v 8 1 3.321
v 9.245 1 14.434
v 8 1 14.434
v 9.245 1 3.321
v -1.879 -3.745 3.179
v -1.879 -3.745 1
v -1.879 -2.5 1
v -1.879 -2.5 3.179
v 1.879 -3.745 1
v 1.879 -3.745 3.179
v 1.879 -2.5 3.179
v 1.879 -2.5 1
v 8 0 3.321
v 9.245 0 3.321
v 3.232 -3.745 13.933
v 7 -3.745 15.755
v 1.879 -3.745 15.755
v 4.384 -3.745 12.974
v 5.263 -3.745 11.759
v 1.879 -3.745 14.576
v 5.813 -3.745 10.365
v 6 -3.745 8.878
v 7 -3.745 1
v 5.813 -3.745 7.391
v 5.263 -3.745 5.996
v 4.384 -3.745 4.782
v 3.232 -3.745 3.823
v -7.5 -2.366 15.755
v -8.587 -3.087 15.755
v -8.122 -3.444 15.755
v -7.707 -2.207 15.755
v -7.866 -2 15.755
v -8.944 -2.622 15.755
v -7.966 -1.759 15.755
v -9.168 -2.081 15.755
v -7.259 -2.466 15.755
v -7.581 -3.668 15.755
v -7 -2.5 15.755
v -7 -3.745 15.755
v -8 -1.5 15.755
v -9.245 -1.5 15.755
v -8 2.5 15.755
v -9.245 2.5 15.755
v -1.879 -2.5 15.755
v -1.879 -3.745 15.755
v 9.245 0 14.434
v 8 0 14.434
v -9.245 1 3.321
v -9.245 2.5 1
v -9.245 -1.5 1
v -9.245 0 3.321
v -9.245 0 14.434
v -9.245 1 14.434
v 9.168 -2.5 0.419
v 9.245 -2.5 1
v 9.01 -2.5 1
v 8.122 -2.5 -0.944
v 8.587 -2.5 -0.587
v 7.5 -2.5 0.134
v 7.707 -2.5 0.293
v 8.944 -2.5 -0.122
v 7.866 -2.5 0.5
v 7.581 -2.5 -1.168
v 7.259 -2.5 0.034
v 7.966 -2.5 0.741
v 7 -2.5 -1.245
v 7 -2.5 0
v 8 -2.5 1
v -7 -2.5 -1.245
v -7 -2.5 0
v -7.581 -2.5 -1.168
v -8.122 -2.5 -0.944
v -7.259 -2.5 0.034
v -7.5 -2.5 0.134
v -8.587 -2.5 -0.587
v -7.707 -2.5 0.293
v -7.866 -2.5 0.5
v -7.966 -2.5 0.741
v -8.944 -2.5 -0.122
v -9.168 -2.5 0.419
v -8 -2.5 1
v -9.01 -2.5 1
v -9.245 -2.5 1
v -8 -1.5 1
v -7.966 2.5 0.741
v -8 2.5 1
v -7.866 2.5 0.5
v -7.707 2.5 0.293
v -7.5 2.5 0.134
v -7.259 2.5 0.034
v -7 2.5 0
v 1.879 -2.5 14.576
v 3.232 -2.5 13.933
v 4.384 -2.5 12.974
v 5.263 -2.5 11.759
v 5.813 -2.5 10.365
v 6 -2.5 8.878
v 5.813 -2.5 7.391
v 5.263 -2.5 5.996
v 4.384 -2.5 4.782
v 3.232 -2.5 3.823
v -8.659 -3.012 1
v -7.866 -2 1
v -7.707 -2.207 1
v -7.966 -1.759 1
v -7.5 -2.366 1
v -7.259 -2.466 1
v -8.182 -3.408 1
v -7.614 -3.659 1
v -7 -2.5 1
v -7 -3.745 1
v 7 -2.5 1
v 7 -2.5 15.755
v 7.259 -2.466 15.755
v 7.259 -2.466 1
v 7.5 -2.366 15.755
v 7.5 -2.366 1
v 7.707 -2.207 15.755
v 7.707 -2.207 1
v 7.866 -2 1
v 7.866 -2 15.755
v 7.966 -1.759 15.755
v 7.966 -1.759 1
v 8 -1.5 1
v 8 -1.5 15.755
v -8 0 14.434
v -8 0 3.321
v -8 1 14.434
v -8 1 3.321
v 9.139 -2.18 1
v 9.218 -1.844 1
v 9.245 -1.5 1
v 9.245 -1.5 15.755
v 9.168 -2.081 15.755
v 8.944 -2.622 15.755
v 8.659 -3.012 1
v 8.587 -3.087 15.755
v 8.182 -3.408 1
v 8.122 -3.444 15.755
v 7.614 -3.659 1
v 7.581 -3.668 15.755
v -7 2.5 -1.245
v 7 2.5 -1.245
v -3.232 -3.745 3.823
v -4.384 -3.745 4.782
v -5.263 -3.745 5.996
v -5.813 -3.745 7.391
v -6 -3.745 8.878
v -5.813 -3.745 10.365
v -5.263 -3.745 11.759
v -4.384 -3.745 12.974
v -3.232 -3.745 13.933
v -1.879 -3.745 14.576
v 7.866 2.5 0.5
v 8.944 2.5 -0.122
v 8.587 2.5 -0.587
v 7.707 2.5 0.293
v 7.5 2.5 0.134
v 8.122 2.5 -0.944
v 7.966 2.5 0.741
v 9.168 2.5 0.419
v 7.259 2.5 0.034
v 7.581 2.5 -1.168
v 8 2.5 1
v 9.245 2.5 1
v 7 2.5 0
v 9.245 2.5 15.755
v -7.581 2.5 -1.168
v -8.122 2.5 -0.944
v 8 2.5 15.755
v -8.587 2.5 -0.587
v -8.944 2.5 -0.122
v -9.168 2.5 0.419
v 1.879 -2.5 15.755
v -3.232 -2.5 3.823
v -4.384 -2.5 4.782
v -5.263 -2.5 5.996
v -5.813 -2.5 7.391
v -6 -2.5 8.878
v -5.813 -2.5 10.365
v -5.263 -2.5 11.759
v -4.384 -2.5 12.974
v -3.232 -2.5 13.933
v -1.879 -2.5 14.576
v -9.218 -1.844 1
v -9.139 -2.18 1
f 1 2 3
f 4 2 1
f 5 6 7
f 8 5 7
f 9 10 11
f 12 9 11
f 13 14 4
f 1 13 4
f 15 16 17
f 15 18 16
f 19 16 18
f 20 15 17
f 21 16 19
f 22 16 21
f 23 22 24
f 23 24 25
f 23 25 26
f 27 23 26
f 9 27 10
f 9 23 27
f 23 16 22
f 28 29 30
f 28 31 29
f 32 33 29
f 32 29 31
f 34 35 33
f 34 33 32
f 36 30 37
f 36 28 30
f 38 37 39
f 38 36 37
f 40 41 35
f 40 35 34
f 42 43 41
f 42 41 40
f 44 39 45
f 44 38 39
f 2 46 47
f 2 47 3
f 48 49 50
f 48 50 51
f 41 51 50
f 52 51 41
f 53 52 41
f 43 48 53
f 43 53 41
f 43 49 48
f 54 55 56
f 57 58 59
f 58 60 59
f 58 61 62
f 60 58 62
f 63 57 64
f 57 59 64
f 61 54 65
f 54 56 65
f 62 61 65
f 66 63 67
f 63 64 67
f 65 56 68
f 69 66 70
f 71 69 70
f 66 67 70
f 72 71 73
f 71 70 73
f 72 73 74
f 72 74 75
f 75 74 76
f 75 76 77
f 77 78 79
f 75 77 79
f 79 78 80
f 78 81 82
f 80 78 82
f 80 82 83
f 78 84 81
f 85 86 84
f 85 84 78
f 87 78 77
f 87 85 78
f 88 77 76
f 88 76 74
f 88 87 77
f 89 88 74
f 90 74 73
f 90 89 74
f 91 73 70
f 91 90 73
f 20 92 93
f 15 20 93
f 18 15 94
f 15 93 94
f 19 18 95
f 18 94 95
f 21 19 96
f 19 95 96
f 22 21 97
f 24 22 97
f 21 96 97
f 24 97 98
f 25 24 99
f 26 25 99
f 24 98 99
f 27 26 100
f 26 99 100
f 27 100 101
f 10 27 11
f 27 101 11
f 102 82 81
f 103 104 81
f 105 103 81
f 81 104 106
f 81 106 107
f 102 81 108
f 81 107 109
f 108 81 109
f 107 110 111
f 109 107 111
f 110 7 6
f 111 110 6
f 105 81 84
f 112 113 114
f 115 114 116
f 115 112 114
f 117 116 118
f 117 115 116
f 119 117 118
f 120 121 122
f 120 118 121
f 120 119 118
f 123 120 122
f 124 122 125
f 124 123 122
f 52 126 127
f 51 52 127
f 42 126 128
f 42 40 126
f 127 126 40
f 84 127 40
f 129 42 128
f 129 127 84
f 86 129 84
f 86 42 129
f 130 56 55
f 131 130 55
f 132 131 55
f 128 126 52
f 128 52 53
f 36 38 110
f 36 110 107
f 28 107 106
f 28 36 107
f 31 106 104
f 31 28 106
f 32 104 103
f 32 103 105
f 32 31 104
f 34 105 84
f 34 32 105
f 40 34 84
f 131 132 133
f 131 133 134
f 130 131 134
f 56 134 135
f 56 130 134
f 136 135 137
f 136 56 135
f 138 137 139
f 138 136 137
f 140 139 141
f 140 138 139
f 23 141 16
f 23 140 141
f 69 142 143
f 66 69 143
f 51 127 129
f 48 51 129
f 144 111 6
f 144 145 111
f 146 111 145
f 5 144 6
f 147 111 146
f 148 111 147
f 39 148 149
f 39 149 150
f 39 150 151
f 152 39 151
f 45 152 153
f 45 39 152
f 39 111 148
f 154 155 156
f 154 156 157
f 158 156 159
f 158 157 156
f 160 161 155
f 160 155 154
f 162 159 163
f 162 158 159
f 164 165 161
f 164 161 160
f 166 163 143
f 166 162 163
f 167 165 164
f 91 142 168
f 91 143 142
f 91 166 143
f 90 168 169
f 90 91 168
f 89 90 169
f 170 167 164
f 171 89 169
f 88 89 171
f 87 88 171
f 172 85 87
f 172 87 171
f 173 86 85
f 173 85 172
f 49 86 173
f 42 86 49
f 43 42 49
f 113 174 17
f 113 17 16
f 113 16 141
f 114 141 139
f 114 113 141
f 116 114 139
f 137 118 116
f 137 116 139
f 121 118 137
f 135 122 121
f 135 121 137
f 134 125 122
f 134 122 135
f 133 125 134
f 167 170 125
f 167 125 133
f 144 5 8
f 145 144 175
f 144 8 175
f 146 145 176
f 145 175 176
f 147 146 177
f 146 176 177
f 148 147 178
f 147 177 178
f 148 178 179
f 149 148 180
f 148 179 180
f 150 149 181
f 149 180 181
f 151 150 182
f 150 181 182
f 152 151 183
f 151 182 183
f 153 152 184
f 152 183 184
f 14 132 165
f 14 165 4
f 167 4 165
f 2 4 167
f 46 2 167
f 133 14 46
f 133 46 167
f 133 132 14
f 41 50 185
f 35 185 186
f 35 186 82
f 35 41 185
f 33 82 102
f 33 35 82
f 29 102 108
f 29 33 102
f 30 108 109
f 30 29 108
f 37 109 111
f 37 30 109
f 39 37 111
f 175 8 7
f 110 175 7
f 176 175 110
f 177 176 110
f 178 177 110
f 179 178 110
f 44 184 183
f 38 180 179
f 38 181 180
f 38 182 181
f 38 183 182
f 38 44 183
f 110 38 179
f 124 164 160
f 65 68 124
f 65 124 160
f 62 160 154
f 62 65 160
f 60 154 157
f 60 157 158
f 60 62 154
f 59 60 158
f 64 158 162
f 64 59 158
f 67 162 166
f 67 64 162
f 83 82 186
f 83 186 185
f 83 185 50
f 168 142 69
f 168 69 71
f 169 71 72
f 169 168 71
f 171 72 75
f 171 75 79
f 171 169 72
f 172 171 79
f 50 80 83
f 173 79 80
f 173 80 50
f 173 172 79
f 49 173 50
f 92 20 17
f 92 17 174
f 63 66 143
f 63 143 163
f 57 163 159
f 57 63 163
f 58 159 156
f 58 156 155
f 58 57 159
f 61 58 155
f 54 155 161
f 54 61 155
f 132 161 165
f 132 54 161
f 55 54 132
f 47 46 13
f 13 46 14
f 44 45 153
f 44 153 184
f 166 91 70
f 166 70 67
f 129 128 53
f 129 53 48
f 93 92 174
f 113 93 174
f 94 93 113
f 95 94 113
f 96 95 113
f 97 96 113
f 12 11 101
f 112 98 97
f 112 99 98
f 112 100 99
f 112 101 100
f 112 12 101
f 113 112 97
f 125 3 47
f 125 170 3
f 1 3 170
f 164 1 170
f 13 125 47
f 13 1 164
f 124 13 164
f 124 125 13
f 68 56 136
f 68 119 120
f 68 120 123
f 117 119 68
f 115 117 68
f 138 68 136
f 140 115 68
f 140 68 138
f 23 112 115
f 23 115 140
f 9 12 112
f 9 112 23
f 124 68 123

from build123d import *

# Parameters (mm, degrees)
SKETCH1_W                      = 16
SKETCH1_H                      = 5
BASE_FLANGE1_DEPTH             = 1.2446
EDGE_FLANGE1_STRIP_W           = 6.9784
EDGE_FLANGE1_STRIP_H           = 1.2446
EDGE_FLANGE1_STRIP_CUT_DEPTH   = 5
EDGE_FLANGE1_STRIP_2_W         = 6.9784
EDGE_FLANGE1_STRIP_2_H         = 1.2446
EDGE_FLANGE1_STRIP_CUT_2_DEPTH = 5
EDGE_FLANGE1_DEPTH             = 5
EDGE_FLANGE1_BEND_DEPTH        = 5
EDGE_FLANGE2_STRIP_W           = 6.9784
EDGE_FLANGE2_STRIP_H           = 1.2446
EDGE_FLANGE2_STRIP_CUT_DEPTH   = 15.7554
EDGE_FLANGE2_STRIP_2_W         = 6.9784
EDGE_FLANGE2_STRIP_2_H         = 1.2446
EDGE_FLANGE2_STRIP_CUT_2_DEPTH = 15.7554
EDGE_FLANGE2_DEPTH             = 15.7554
EDGE_FLANGE2_BEND_DEPTH        = 15.7554
SKETCH15_R                     = 6
CUT_EXTRUDE1_DEPTH             = 20.778929656
SKETCH16_W                     = 11.1125
SKETCH16_H                     = 1
CUT_EXTRUDE2_DEPTH             = 26.231249968
SKETCH17_W                     = 18.4892
SKETCH17_H                     = 1
CUT_EXTRUDE3_DEPTH             = 21.129607236


# Sheet-metal steps are written as plain solids
with BuildPart() as part:
    # Sketch1 → Base-Flange1 (new body)
    with BuildSketch(Plane.XY):
        Rectangle(SKETCH1_W, SKETCH1_H)
    extrude(amount=-BASE_FLANGE1_DEPTH)

    # Edge-Flange1 strip (across the edge) → Edge-Flange1 strip cut (cut)
    with BuildSketch(Plane(origin=(8, -2.5, 0), x_dir=(-1, 0, 0), z_dir=(0, 1, 0))):
        with Locations((-2.4892, -0.6223)):
            Rectangle(EDGE_FLANGE1_STRIP_W, EDGE_FLANGE1_STRIP_H)
    extrude(amount=EDGE_FLANGE1_STRIP_CUT_DEPTH, mode=Mode.SUBTRACT)

    # Edge-Flange1 strip 2 (across the edge) → Edge-Flange1 strip cut 2 (cut)
    with BuildSketch(Plane(origin=(-8, 2.5, 0), x_dir=(1, 0, 0), z_dir=(0, -1, 0))):
        with Locations((-2.4892, -0.6223)):
            Rectangle(EDGE_FLANGE1_STRIP_2_W, EDGE_FLANGE1_STRIP_2_H)
    extrude(amount=EDGE_FLANGE1_STRIP_CUT_2_DEPTH, mode=Mode.SUBTRACT)

    # Edge-Flange1 section (across the edge) → Edge-Flange1 (add)
    with BuildSketch(Plane(origin=(8, -2.5, 0), x_dir=(-1, 0, 0), z_dir=(0, 1, 0))):
        with BuildLine():
            Line((-1.2446, 1), (-1.2446, 16.7554))
            Line((-1.2446, 16.7554), (0, 16.7554))
            Line((0, 16.7554), (0, 1))
            ThreePointArc((0, 1), (0.292893219, 0.292893219), (1, 0))
            Line((1, 0), (1, -1.2446))
            ThreePointArc((1, -1.2446), (-0.587171881, -0.587171881), (-1.2446, 1))
        make_face()
    extrude(amount=EDGE_FLANGE1_DEPTH)

    # Edge-Flange1 section 2 (across the edge) → Edge-Flange1 bend (add)
    with BuildSketch(Plane(origin=(-8, 2.5, 0), x_dir=(1, 0, 0), z_dir=(0, -1, 0))):
        with BuildLine():
            Line((-1.2446, 1), (-1.2446, 16.7554))
            Line((-1.2446, 16.7554), (0, 16.7554))
            Line((0, 16.7554), (0, 1))
            ThreePointArc((0, 1), (0.292893219, 0.292893219), (1, 0))
            Line((1, 0), (1, -1.2446))
            ThreePointArc((1, -1.2446), (-0.587171881, -0.587171881), (-1.2446, 1))
        make_face()
    extrude(amount=EDGE_FLANGE1_BEND_DEPTH)

    # Edge-Flange2 strip (across the edge) → Edge-Flange2 strip cut (cut)
    with BuildSketch(Plane(origin=(-8, -2.5, 16.7554), x_dir=(0, 1, 0), z_dir=(0, 0, -1))):
        with Locations((-2.4892, -0.6223)):
            Rectangle(EDGE_FLANGE2_STRIP_W, EDGE_FLANGE2_STRIP_H)
    extrude(amount=EDGE_FLANGE2_STRIP_CUT_DEPTH, mode=Mode.SUBTRACT)

    # Edge-Flange2 strip 2 (across the edge) → Edge-Flange2 strip cut 2 (cut)
    with BuildSketch(Plane(origin=(8, -2.5, 1), x_dir=(0, 1, 0), z_dir=(0, 0, 1))):
        with Locations((-2.4892, -0.6223)):
            Rectangle(EDGE_FLANGE2_STRIP_2_W, EDGE_FLANGE2_STRIP_2_H)
    extrude(amount=EDGE_FLANGE2_STRIP_CUT_2_DEPTH, mode=Mode.SUBTRACT)

    # Edge-Flange2 section (across the edge) → Edge-Flange2 (add)
    with BuildSketch(Plane(origin=(-8, -2.5, 16.7554), x_dir=(0, 1, 0), z_dir=(0, 0, -1))):
        with BuildLine():
            Line((-1.2446, 1), (-1.2446, 6.1214))
            Line((-1.2446, 6.1214), (0, 6.1214))
            Line((0, 6.1214), (0, 1))
            ThreePointArc((0, 1), (0.292893219, 0.292893219), (1, 0))
            Line((1, 0), (1, -1.2446))
            ThreePointArc((1, -1.2446), (-0.587171881, -0.587171881), (-1.2446, 1))
        make_face()
    extrude(amount=EDGE_FLANGE2_DEPTH)

    # Edge-Flange2 section 2 (across the edge) → Edge-Flange2 bend (add)
    with BuildSketch(Plane(origin=(8, -2.5, 1), x_dir=(0, 1, 0), z_dir=(0, 0, 1))):
        with BuildLine():
            Line((-1.2446, 1), (-1.2446, 6.1214))
            Line((-1.2446, 6.1214), (0, 6.1214))
            Line((0, 6.1214), (0, 1))
            ThreePointArc((0, 1), (0.292893219, 0.292893219), (1, 0))
            Line((1, 0), (1, -1.2446))
            ThreePointArc((1, -1.2446), (-0.587171881, -0.587171881), (-1.2446, 1))
        make_face()
    extrude(amount=EDGE_FLANGE2_BEND_DEPTH)

    # Sketch15 → Cut-Extrude1 (cut, through all)
    with BuildSketch(Plane(origin=(0, -2.5, 0), x_dir=(1, 0, 0), z_dir=(0, 1, 0))):
        with Locations((0, -8.8777)):
            Circle(SKETCH15_R)
    extrude(amount=-CUT_EXTRUDE1_DEPTH, mode=Mode.SUBTRACT)

    # Sketch16 → Cut-Extrude2 (cut, through all)
    with BuildSketch(Plane(origin=(9.2446, 0, 0), x_dir=(0, 0, -1), z_dir=(1, 0, 0))):
        with Locations((-8.8777, 0.5)):
            Rectangle(SKETCH16_W, SKETCH16_H)
    extrude(amount=-CUT_EXTRUDE2_DEPTH, mode=Mode.SUBTRACT)

    # Sketch17 → Cut-Extrude3 (cut, through all)
    with BuildSketch(Plane(origin=(0, 2.5, 0), x_dir=(1, 0, 0), z_dir=(0, 1, 0))):
        with Locations((0, -16.2554)):
            Rectangle(SKETCH17_W, SKETCH17_H)
    extrude(amount=-CUT_EXTRUDE3_DEPTH, mode=Mode.SUBTRACT)


solid = part.part
